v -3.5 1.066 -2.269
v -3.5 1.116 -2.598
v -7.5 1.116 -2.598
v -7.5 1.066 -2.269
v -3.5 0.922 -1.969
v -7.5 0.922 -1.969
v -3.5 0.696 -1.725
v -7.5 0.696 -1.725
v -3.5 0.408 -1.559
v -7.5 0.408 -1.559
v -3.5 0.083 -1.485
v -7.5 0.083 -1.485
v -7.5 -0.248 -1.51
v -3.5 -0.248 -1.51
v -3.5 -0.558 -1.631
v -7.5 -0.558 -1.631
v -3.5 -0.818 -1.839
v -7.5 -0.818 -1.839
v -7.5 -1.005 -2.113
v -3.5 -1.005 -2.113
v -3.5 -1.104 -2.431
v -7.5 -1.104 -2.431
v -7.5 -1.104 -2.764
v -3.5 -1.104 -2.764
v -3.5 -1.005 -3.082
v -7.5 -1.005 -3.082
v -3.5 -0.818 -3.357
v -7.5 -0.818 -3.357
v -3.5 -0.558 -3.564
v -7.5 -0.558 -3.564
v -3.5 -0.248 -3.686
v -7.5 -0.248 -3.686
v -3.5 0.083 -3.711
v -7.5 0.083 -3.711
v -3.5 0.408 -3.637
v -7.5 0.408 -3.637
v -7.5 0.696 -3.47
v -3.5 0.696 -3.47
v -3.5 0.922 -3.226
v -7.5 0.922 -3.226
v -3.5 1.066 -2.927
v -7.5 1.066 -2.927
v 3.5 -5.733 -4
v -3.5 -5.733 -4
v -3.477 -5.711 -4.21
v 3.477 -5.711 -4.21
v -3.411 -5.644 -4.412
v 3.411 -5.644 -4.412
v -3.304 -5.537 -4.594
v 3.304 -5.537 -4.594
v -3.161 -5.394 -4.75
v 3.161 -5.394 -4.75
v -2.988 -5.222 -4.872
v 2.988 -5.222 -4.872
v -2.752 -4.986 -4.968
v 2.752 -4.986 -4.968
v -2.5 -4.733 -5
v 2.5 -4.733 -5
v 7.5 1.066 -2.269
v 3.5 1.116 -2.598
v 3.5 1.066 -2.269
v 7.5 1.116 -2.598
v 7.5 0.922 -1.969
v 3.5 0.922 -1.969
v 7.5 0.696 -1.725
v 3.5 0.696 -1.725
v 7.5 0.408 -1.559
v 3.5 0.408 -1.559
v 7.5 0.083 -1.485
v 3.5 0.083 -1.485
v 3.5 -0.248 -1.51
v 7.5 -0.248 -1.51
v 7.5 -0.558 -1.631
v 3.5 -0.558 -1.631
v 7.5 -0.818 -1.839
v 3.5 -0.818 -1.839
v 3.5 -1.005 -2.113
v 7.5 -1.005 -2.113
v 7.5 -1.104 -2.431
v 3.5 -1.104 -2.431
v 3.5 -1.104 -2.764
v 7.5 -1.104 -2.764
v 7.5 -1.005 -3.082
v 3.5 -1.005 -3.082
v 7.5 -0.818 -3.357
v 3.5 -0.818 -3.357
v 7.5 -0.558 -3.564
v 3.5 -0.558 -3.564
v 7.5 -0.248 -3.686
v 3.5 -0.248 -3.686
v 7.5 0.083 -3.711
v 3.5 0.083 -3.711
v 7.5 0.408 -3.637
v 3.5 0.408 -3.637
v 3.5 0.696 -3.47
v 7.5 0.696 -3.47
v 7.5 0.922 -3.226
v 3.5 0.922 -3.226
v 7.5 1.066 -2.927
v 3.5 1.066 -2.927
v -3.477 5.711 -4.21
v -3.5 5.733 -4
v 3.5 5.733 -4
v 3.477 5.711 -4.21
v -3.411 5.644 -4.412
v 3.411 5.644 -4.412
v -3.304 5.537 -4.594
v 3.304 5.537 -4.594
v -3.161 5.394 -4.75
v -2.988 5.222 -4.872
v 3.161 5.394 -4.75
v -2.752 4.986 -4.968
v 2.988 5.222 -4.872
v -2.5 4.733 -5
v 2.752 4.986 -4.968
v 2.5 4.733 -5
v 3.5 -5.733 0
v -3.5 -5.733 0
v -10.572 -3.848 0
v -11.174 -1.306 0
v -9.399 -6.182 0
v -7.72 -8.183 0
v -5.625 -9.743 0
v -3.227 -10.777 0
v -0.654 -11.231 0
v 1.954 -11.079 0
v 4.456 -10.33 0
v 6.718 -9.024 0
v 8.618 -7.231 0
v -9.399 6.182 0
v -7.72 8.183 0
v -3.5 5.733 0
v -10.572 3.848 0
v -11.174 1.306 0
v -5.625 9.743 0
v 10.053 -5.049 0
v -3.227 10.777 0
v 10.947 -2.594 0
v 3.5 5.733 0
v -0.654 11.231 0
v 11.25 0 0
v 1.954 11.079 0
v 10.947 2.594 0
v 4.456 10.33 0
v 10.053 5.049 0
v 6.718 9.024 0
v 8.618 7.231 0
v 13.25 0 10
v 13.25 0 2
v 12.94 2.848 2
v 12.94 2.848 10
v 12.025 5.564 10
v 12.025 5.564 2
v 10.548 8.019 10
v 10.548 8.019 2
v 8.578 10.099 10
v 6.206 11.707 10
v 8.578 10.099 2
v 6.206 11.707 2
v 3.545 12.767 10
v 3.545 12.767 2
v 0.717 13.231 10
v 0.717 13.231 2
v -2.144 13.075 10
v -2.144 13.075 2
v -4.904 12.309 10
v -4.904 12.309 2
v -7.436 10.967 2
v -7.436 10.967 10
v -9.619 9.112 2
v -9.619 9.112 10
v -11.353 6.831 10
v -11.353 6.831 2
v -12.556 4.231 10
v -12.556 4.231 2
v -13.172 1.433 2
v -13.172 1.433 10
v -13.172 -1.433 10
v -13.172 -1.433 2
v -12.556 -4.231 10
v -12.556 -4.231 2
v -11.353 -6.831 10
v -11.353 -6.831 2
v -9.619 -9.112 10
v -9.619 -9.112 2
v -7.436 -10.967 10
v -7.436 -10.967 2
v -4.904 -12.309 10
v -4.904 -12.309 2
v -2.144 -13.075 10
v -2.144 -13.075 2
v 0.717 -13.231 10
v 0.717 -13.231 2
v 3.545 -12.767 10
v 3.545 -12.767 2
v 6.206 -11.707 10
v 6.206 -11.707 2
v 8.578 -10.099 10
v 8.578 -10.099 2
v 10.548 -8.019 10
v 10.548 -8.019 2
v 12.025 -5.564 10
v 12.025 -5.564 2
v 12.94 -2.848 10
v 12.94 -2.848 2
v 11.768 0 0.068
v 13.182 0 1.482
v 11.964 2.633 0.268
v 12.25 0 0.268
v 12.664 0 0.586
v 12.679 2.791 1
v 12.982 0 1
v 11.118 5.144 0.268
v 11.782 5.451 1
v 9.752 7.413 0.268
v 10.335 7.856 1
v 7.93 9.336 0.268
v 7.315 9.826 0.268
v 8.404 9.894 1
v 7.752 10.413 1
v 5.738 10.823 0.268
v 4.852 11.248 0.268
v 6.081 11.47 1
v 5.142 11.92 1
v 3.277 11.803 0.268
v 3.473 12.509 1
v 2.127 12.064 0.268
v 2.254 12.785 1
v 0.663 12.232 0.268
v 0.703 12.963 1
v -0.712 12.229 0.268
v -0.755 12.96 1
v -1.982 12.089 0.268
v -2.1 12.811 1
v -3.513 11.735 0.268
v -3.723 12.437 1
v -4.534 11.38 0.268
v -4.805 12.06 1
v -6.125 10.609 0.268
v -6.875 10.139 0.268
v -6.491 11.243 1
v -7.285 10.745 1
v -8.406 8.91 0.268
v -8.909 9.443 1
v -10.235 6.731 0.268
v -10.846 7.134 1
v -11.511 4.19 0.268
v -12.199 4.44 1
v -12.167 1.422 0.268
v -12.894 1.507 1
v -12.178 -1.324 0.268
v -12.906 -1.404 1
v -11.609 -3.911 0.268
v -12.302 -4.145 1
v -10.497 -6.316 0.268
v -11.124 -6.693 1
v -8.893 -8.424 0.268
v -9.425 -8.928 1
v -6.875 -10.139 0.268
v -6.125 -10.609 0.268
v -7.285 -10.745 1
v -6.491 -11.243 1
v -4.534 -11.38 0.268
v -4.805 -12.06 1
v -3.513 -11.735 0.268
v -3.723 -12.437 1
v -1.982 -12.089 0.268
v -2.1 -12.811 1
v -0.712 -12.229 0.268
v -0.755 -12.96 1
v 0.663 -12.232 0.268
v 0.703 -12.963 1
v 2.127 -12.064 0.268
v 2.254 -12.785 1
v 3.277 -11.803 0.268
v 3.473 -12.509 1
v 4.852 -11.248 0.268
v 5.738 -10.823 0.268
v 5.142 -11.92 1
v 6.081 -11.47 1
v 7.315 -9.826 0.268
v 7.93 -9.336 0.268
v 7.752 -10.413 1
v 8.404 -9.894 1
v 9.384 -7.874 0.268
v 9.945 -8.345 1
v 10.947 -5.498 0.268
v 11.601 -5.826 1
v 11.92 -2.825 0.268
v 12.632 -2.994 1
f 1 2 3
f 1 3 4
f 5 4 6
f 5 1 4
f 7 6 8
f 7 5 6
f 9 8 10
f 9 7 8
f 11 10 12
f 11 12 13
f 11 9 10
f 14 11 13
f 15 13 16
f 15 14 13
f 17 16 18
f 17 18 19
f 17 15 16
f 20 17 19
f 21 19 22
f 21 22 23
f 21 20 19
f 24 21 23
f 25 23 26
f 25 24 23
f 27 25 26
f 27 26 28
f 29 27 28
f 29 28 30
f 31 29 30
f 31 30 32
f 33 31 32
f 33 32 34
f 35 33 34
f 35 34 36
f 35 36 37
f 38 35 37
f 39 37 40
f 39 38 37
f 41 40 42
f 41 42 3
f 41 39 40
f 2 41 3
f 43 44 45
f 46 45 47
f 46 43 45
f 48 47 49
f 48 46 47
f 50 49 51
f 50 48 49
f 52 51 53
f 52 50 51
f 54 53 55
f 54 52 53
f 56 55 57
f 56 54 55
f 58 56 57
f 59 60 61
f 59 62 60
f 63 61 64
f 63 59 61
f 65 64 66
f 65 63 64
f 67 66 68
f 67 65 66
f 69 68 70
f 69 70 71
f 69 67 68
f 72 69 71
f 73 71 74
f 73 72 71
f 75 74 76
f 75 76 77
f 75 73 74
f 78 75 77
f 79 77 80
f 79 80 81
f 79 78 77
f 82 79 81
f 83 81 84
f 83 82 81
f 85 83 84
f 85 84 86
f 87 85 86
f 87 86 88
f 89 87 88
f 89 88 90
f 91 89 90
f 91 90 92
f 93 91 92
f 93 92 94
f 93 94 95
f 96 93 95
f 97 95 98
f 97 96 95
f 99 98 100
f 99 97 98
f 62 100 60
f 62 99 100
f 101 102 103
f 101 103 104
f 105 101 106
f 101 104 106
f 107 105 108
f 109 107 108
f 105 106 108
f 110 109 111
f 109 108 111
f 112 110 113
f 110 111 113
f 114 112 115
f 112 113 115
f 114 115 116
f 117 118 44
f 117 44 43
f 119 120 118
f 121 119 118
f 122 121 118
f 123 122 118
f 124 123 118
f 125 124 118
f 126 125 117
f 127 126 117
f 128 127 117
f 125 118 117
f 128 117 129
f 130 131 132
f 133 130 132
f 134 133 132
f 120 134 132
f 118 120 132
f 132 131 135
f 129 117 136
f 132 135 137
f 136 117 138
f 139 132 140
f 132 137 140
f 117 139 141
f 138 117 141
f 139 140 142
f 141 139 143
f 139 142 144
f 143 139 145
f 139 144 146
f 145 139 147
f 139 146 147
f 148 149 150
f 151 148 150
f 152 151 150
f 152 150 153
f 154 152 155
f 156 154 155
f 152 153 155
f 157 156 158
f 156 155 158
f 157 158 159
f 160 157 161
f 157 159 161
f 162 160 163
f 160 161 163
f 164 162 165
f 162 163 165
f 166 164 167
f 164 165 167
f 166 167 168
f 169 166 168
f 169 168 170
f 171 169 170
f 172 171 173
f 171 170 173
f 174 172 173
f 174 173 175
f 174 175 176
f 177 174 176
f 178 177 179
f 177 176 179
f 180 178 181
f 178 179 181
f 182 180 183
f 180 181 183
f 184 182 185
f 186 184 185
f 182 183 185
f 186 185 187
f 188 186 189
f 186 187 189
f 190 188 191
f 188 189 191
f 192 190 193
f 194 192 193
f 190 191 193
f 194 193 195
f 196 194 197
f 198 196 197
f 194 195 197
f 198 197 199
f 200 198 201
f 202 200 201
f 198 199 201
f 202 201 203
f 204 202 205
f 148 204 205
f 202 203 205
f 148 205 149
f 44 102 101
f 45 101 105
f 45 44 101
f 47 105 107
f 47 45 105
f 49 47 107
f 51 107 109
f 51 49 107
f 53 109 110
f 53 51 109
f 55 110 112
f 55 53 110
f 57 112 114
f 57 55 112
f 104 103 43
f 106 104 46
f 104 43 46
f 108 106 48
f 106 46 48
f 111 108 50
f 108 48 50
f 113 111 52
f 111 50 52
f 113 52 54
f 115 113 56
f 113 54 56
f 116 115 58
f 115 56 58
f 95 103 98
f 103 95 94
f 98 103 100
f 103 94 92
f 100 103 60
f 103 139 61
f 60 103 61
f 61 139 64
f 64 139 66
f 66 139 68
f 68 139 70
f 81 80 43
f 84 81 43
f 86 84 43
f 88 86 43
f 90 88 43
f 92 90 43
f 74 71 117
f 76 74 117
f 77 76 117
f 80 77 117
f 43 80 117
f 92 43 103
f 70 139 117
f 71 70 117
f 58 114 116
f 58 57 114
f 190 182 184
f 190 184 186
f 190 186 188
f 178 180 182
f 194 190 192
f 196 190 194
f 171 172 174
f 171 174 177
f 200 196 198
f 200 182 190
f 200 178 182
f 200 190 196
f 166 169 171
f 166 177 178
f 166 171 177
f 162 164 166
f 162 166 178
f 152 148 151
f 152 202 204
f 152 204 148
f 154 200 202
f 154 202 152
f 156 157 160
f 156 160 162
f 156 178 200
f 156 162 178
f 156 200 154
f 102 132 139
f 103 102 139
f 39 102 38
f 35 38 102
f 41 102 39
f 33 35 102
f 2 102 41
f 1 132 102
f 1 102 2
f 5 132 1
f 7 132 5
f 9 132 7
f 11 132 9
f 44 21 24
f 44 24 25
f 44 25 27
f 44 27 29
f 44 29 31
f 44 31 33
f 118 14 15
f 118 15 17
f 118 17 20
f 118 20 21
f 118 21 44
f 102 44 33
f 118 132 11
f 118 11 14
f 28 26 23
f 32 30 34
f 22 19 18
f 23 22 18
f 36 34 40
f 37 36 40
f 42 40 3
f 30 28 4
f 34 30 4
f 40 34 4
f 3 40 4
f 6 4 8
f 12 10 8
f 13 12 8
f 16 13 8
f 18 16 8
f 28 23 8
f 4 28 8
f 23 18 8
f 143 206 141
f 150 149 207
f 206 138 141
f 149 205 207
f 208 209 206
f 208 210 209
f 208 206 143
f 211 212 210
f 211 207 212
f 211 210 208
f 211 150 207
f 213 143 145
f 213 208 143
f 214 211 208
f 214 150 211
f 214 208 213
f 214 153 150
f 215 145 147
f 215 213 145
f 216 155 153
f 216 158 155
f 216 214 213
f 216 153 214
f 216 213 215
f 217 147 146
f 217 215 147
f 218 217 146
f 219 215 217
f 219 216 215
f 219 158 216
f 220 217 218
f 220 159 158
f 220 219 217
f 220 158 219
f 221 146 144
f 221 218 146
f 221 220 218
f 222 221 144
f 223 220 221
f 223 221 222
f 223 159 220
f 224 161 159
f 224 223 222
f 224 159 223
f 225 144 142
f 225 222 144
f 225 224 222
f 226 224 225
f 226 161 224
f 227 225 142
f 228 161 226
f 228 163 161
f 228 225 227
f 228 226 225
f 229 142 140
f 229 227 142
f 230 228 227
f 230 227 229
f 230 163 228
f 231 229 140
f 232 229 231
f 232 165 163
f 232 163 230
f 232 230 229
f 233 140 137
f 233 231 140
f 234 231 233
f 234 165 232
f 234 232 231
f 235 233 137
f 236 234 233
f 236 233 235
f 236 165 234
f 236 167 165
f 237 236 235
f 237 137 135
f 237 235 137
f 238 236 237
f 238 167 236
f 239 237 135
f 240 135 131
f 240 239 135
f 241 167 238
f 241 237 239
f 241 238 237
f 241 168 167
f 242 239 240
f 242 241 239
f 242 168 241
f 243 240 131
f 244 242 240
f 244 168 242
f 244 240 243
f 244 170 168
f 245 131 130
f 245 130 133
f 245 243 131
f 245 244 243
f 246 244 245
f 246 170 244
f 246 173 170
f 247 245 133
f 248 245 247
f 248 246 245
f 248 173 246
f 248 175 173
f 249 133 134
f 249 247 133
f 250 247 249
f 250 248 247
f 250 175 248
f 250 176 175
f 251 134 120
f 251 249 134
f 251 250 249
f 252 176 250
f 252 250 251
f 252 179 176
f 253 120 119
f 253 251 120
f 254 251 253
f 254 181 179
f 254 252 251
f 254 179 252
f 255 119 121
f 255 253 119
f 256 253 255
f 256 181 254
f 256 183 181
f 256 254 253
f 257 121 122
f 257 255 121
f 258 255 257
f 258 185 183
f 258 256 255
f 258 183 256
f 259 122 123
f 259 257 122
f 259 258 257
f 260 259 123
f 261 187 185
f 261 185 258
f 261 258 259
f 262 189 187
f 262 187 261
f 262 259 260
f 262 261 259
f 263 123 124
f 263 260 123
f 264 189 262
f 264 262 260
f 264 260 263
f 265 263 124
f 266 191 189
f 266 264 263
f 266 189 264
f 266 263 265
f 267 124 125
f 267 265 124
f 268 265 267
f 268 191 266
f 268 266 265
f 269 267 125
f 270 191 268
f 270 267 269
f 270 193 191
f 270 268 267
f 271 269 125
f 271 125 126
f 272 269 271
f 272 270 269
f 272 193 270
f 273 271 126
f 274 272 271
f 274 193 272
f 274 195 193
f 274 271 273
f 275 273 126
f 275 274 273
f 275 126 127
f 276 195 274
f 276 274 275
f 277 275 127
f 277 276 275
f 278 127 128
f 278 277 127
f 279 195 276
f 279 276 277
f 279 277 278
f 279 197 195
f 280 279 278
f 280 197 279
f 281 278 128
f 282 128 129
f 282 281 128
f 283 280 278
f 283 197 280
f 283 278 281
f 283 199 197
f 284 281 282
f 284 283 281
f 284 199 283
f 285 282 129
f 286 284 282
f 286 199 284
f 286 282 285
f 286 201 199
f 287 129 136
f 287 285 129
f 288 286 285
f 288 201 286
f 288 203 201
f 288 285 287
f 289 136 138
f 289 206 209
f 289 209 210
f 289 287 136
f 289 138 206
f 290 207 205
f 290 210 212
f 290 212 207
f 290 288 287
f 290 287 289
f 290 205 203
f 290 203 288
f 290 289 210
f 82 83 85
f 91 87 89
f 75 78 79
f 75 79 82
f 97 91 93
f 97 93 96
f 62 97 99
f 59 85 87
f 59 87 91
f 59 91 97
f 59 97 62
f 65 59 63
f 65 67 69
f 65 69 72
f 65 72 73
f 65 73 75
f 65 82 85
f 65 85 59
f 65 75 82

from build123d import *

# Parameters (mm, degrees)
F0_R     = 13.25
F1_DEPTH = 10
F2_W     = 6.9995252416
F2_H     = 11.4660244435
F3_DEPTH = 5
F4_R     = 1.115966898
F5_DEPTH = 7.5
F6_R     = 2
F7_R     = 1


with BuildPart() as f1:
    # F0 (on Top) → F1 (new body)
    with BuildSketch(Plane.XY):
        Circle(F0_R)
    extrude(amount=F1_DEPTH)

    # F2 (on face) → F3 (join)
    with BuildSketch(Plane(origin=(0, 0, 0), x_dir=(1, 0, 0), z_dir=(0, 0, -1))):
        Rectangle(F2_W, F2_H)
    extrude(amount=F3_DEPTH)

    # F4 (on Right) → F5 (join, symmetric)
    with BuildSketch(Plane.YZ):
        with Locations((0, -2.5976826437)):
            Circle(F4_R)
    extrude(amount=F5_DEPTH, both=True)

    # F6
    f6_edges = [f1.edges().sort_by_distance(p)[0] for p in [
        (-13.25, 0, 0),
    ]]
    fillet(f6_edges, radius=F6_R)

    # F7
    f7_edges = [f1.edges().sort_by_distance(p)[0] for p in [
        (0, 5.733012, -5),
        (3.499763, 0, -5),
        (0, -5.733012, -5),
        (-3.499763, 0, -5),
    ]]
    fillet(f7_edges, radius=F7_R)


solid = f1.part
